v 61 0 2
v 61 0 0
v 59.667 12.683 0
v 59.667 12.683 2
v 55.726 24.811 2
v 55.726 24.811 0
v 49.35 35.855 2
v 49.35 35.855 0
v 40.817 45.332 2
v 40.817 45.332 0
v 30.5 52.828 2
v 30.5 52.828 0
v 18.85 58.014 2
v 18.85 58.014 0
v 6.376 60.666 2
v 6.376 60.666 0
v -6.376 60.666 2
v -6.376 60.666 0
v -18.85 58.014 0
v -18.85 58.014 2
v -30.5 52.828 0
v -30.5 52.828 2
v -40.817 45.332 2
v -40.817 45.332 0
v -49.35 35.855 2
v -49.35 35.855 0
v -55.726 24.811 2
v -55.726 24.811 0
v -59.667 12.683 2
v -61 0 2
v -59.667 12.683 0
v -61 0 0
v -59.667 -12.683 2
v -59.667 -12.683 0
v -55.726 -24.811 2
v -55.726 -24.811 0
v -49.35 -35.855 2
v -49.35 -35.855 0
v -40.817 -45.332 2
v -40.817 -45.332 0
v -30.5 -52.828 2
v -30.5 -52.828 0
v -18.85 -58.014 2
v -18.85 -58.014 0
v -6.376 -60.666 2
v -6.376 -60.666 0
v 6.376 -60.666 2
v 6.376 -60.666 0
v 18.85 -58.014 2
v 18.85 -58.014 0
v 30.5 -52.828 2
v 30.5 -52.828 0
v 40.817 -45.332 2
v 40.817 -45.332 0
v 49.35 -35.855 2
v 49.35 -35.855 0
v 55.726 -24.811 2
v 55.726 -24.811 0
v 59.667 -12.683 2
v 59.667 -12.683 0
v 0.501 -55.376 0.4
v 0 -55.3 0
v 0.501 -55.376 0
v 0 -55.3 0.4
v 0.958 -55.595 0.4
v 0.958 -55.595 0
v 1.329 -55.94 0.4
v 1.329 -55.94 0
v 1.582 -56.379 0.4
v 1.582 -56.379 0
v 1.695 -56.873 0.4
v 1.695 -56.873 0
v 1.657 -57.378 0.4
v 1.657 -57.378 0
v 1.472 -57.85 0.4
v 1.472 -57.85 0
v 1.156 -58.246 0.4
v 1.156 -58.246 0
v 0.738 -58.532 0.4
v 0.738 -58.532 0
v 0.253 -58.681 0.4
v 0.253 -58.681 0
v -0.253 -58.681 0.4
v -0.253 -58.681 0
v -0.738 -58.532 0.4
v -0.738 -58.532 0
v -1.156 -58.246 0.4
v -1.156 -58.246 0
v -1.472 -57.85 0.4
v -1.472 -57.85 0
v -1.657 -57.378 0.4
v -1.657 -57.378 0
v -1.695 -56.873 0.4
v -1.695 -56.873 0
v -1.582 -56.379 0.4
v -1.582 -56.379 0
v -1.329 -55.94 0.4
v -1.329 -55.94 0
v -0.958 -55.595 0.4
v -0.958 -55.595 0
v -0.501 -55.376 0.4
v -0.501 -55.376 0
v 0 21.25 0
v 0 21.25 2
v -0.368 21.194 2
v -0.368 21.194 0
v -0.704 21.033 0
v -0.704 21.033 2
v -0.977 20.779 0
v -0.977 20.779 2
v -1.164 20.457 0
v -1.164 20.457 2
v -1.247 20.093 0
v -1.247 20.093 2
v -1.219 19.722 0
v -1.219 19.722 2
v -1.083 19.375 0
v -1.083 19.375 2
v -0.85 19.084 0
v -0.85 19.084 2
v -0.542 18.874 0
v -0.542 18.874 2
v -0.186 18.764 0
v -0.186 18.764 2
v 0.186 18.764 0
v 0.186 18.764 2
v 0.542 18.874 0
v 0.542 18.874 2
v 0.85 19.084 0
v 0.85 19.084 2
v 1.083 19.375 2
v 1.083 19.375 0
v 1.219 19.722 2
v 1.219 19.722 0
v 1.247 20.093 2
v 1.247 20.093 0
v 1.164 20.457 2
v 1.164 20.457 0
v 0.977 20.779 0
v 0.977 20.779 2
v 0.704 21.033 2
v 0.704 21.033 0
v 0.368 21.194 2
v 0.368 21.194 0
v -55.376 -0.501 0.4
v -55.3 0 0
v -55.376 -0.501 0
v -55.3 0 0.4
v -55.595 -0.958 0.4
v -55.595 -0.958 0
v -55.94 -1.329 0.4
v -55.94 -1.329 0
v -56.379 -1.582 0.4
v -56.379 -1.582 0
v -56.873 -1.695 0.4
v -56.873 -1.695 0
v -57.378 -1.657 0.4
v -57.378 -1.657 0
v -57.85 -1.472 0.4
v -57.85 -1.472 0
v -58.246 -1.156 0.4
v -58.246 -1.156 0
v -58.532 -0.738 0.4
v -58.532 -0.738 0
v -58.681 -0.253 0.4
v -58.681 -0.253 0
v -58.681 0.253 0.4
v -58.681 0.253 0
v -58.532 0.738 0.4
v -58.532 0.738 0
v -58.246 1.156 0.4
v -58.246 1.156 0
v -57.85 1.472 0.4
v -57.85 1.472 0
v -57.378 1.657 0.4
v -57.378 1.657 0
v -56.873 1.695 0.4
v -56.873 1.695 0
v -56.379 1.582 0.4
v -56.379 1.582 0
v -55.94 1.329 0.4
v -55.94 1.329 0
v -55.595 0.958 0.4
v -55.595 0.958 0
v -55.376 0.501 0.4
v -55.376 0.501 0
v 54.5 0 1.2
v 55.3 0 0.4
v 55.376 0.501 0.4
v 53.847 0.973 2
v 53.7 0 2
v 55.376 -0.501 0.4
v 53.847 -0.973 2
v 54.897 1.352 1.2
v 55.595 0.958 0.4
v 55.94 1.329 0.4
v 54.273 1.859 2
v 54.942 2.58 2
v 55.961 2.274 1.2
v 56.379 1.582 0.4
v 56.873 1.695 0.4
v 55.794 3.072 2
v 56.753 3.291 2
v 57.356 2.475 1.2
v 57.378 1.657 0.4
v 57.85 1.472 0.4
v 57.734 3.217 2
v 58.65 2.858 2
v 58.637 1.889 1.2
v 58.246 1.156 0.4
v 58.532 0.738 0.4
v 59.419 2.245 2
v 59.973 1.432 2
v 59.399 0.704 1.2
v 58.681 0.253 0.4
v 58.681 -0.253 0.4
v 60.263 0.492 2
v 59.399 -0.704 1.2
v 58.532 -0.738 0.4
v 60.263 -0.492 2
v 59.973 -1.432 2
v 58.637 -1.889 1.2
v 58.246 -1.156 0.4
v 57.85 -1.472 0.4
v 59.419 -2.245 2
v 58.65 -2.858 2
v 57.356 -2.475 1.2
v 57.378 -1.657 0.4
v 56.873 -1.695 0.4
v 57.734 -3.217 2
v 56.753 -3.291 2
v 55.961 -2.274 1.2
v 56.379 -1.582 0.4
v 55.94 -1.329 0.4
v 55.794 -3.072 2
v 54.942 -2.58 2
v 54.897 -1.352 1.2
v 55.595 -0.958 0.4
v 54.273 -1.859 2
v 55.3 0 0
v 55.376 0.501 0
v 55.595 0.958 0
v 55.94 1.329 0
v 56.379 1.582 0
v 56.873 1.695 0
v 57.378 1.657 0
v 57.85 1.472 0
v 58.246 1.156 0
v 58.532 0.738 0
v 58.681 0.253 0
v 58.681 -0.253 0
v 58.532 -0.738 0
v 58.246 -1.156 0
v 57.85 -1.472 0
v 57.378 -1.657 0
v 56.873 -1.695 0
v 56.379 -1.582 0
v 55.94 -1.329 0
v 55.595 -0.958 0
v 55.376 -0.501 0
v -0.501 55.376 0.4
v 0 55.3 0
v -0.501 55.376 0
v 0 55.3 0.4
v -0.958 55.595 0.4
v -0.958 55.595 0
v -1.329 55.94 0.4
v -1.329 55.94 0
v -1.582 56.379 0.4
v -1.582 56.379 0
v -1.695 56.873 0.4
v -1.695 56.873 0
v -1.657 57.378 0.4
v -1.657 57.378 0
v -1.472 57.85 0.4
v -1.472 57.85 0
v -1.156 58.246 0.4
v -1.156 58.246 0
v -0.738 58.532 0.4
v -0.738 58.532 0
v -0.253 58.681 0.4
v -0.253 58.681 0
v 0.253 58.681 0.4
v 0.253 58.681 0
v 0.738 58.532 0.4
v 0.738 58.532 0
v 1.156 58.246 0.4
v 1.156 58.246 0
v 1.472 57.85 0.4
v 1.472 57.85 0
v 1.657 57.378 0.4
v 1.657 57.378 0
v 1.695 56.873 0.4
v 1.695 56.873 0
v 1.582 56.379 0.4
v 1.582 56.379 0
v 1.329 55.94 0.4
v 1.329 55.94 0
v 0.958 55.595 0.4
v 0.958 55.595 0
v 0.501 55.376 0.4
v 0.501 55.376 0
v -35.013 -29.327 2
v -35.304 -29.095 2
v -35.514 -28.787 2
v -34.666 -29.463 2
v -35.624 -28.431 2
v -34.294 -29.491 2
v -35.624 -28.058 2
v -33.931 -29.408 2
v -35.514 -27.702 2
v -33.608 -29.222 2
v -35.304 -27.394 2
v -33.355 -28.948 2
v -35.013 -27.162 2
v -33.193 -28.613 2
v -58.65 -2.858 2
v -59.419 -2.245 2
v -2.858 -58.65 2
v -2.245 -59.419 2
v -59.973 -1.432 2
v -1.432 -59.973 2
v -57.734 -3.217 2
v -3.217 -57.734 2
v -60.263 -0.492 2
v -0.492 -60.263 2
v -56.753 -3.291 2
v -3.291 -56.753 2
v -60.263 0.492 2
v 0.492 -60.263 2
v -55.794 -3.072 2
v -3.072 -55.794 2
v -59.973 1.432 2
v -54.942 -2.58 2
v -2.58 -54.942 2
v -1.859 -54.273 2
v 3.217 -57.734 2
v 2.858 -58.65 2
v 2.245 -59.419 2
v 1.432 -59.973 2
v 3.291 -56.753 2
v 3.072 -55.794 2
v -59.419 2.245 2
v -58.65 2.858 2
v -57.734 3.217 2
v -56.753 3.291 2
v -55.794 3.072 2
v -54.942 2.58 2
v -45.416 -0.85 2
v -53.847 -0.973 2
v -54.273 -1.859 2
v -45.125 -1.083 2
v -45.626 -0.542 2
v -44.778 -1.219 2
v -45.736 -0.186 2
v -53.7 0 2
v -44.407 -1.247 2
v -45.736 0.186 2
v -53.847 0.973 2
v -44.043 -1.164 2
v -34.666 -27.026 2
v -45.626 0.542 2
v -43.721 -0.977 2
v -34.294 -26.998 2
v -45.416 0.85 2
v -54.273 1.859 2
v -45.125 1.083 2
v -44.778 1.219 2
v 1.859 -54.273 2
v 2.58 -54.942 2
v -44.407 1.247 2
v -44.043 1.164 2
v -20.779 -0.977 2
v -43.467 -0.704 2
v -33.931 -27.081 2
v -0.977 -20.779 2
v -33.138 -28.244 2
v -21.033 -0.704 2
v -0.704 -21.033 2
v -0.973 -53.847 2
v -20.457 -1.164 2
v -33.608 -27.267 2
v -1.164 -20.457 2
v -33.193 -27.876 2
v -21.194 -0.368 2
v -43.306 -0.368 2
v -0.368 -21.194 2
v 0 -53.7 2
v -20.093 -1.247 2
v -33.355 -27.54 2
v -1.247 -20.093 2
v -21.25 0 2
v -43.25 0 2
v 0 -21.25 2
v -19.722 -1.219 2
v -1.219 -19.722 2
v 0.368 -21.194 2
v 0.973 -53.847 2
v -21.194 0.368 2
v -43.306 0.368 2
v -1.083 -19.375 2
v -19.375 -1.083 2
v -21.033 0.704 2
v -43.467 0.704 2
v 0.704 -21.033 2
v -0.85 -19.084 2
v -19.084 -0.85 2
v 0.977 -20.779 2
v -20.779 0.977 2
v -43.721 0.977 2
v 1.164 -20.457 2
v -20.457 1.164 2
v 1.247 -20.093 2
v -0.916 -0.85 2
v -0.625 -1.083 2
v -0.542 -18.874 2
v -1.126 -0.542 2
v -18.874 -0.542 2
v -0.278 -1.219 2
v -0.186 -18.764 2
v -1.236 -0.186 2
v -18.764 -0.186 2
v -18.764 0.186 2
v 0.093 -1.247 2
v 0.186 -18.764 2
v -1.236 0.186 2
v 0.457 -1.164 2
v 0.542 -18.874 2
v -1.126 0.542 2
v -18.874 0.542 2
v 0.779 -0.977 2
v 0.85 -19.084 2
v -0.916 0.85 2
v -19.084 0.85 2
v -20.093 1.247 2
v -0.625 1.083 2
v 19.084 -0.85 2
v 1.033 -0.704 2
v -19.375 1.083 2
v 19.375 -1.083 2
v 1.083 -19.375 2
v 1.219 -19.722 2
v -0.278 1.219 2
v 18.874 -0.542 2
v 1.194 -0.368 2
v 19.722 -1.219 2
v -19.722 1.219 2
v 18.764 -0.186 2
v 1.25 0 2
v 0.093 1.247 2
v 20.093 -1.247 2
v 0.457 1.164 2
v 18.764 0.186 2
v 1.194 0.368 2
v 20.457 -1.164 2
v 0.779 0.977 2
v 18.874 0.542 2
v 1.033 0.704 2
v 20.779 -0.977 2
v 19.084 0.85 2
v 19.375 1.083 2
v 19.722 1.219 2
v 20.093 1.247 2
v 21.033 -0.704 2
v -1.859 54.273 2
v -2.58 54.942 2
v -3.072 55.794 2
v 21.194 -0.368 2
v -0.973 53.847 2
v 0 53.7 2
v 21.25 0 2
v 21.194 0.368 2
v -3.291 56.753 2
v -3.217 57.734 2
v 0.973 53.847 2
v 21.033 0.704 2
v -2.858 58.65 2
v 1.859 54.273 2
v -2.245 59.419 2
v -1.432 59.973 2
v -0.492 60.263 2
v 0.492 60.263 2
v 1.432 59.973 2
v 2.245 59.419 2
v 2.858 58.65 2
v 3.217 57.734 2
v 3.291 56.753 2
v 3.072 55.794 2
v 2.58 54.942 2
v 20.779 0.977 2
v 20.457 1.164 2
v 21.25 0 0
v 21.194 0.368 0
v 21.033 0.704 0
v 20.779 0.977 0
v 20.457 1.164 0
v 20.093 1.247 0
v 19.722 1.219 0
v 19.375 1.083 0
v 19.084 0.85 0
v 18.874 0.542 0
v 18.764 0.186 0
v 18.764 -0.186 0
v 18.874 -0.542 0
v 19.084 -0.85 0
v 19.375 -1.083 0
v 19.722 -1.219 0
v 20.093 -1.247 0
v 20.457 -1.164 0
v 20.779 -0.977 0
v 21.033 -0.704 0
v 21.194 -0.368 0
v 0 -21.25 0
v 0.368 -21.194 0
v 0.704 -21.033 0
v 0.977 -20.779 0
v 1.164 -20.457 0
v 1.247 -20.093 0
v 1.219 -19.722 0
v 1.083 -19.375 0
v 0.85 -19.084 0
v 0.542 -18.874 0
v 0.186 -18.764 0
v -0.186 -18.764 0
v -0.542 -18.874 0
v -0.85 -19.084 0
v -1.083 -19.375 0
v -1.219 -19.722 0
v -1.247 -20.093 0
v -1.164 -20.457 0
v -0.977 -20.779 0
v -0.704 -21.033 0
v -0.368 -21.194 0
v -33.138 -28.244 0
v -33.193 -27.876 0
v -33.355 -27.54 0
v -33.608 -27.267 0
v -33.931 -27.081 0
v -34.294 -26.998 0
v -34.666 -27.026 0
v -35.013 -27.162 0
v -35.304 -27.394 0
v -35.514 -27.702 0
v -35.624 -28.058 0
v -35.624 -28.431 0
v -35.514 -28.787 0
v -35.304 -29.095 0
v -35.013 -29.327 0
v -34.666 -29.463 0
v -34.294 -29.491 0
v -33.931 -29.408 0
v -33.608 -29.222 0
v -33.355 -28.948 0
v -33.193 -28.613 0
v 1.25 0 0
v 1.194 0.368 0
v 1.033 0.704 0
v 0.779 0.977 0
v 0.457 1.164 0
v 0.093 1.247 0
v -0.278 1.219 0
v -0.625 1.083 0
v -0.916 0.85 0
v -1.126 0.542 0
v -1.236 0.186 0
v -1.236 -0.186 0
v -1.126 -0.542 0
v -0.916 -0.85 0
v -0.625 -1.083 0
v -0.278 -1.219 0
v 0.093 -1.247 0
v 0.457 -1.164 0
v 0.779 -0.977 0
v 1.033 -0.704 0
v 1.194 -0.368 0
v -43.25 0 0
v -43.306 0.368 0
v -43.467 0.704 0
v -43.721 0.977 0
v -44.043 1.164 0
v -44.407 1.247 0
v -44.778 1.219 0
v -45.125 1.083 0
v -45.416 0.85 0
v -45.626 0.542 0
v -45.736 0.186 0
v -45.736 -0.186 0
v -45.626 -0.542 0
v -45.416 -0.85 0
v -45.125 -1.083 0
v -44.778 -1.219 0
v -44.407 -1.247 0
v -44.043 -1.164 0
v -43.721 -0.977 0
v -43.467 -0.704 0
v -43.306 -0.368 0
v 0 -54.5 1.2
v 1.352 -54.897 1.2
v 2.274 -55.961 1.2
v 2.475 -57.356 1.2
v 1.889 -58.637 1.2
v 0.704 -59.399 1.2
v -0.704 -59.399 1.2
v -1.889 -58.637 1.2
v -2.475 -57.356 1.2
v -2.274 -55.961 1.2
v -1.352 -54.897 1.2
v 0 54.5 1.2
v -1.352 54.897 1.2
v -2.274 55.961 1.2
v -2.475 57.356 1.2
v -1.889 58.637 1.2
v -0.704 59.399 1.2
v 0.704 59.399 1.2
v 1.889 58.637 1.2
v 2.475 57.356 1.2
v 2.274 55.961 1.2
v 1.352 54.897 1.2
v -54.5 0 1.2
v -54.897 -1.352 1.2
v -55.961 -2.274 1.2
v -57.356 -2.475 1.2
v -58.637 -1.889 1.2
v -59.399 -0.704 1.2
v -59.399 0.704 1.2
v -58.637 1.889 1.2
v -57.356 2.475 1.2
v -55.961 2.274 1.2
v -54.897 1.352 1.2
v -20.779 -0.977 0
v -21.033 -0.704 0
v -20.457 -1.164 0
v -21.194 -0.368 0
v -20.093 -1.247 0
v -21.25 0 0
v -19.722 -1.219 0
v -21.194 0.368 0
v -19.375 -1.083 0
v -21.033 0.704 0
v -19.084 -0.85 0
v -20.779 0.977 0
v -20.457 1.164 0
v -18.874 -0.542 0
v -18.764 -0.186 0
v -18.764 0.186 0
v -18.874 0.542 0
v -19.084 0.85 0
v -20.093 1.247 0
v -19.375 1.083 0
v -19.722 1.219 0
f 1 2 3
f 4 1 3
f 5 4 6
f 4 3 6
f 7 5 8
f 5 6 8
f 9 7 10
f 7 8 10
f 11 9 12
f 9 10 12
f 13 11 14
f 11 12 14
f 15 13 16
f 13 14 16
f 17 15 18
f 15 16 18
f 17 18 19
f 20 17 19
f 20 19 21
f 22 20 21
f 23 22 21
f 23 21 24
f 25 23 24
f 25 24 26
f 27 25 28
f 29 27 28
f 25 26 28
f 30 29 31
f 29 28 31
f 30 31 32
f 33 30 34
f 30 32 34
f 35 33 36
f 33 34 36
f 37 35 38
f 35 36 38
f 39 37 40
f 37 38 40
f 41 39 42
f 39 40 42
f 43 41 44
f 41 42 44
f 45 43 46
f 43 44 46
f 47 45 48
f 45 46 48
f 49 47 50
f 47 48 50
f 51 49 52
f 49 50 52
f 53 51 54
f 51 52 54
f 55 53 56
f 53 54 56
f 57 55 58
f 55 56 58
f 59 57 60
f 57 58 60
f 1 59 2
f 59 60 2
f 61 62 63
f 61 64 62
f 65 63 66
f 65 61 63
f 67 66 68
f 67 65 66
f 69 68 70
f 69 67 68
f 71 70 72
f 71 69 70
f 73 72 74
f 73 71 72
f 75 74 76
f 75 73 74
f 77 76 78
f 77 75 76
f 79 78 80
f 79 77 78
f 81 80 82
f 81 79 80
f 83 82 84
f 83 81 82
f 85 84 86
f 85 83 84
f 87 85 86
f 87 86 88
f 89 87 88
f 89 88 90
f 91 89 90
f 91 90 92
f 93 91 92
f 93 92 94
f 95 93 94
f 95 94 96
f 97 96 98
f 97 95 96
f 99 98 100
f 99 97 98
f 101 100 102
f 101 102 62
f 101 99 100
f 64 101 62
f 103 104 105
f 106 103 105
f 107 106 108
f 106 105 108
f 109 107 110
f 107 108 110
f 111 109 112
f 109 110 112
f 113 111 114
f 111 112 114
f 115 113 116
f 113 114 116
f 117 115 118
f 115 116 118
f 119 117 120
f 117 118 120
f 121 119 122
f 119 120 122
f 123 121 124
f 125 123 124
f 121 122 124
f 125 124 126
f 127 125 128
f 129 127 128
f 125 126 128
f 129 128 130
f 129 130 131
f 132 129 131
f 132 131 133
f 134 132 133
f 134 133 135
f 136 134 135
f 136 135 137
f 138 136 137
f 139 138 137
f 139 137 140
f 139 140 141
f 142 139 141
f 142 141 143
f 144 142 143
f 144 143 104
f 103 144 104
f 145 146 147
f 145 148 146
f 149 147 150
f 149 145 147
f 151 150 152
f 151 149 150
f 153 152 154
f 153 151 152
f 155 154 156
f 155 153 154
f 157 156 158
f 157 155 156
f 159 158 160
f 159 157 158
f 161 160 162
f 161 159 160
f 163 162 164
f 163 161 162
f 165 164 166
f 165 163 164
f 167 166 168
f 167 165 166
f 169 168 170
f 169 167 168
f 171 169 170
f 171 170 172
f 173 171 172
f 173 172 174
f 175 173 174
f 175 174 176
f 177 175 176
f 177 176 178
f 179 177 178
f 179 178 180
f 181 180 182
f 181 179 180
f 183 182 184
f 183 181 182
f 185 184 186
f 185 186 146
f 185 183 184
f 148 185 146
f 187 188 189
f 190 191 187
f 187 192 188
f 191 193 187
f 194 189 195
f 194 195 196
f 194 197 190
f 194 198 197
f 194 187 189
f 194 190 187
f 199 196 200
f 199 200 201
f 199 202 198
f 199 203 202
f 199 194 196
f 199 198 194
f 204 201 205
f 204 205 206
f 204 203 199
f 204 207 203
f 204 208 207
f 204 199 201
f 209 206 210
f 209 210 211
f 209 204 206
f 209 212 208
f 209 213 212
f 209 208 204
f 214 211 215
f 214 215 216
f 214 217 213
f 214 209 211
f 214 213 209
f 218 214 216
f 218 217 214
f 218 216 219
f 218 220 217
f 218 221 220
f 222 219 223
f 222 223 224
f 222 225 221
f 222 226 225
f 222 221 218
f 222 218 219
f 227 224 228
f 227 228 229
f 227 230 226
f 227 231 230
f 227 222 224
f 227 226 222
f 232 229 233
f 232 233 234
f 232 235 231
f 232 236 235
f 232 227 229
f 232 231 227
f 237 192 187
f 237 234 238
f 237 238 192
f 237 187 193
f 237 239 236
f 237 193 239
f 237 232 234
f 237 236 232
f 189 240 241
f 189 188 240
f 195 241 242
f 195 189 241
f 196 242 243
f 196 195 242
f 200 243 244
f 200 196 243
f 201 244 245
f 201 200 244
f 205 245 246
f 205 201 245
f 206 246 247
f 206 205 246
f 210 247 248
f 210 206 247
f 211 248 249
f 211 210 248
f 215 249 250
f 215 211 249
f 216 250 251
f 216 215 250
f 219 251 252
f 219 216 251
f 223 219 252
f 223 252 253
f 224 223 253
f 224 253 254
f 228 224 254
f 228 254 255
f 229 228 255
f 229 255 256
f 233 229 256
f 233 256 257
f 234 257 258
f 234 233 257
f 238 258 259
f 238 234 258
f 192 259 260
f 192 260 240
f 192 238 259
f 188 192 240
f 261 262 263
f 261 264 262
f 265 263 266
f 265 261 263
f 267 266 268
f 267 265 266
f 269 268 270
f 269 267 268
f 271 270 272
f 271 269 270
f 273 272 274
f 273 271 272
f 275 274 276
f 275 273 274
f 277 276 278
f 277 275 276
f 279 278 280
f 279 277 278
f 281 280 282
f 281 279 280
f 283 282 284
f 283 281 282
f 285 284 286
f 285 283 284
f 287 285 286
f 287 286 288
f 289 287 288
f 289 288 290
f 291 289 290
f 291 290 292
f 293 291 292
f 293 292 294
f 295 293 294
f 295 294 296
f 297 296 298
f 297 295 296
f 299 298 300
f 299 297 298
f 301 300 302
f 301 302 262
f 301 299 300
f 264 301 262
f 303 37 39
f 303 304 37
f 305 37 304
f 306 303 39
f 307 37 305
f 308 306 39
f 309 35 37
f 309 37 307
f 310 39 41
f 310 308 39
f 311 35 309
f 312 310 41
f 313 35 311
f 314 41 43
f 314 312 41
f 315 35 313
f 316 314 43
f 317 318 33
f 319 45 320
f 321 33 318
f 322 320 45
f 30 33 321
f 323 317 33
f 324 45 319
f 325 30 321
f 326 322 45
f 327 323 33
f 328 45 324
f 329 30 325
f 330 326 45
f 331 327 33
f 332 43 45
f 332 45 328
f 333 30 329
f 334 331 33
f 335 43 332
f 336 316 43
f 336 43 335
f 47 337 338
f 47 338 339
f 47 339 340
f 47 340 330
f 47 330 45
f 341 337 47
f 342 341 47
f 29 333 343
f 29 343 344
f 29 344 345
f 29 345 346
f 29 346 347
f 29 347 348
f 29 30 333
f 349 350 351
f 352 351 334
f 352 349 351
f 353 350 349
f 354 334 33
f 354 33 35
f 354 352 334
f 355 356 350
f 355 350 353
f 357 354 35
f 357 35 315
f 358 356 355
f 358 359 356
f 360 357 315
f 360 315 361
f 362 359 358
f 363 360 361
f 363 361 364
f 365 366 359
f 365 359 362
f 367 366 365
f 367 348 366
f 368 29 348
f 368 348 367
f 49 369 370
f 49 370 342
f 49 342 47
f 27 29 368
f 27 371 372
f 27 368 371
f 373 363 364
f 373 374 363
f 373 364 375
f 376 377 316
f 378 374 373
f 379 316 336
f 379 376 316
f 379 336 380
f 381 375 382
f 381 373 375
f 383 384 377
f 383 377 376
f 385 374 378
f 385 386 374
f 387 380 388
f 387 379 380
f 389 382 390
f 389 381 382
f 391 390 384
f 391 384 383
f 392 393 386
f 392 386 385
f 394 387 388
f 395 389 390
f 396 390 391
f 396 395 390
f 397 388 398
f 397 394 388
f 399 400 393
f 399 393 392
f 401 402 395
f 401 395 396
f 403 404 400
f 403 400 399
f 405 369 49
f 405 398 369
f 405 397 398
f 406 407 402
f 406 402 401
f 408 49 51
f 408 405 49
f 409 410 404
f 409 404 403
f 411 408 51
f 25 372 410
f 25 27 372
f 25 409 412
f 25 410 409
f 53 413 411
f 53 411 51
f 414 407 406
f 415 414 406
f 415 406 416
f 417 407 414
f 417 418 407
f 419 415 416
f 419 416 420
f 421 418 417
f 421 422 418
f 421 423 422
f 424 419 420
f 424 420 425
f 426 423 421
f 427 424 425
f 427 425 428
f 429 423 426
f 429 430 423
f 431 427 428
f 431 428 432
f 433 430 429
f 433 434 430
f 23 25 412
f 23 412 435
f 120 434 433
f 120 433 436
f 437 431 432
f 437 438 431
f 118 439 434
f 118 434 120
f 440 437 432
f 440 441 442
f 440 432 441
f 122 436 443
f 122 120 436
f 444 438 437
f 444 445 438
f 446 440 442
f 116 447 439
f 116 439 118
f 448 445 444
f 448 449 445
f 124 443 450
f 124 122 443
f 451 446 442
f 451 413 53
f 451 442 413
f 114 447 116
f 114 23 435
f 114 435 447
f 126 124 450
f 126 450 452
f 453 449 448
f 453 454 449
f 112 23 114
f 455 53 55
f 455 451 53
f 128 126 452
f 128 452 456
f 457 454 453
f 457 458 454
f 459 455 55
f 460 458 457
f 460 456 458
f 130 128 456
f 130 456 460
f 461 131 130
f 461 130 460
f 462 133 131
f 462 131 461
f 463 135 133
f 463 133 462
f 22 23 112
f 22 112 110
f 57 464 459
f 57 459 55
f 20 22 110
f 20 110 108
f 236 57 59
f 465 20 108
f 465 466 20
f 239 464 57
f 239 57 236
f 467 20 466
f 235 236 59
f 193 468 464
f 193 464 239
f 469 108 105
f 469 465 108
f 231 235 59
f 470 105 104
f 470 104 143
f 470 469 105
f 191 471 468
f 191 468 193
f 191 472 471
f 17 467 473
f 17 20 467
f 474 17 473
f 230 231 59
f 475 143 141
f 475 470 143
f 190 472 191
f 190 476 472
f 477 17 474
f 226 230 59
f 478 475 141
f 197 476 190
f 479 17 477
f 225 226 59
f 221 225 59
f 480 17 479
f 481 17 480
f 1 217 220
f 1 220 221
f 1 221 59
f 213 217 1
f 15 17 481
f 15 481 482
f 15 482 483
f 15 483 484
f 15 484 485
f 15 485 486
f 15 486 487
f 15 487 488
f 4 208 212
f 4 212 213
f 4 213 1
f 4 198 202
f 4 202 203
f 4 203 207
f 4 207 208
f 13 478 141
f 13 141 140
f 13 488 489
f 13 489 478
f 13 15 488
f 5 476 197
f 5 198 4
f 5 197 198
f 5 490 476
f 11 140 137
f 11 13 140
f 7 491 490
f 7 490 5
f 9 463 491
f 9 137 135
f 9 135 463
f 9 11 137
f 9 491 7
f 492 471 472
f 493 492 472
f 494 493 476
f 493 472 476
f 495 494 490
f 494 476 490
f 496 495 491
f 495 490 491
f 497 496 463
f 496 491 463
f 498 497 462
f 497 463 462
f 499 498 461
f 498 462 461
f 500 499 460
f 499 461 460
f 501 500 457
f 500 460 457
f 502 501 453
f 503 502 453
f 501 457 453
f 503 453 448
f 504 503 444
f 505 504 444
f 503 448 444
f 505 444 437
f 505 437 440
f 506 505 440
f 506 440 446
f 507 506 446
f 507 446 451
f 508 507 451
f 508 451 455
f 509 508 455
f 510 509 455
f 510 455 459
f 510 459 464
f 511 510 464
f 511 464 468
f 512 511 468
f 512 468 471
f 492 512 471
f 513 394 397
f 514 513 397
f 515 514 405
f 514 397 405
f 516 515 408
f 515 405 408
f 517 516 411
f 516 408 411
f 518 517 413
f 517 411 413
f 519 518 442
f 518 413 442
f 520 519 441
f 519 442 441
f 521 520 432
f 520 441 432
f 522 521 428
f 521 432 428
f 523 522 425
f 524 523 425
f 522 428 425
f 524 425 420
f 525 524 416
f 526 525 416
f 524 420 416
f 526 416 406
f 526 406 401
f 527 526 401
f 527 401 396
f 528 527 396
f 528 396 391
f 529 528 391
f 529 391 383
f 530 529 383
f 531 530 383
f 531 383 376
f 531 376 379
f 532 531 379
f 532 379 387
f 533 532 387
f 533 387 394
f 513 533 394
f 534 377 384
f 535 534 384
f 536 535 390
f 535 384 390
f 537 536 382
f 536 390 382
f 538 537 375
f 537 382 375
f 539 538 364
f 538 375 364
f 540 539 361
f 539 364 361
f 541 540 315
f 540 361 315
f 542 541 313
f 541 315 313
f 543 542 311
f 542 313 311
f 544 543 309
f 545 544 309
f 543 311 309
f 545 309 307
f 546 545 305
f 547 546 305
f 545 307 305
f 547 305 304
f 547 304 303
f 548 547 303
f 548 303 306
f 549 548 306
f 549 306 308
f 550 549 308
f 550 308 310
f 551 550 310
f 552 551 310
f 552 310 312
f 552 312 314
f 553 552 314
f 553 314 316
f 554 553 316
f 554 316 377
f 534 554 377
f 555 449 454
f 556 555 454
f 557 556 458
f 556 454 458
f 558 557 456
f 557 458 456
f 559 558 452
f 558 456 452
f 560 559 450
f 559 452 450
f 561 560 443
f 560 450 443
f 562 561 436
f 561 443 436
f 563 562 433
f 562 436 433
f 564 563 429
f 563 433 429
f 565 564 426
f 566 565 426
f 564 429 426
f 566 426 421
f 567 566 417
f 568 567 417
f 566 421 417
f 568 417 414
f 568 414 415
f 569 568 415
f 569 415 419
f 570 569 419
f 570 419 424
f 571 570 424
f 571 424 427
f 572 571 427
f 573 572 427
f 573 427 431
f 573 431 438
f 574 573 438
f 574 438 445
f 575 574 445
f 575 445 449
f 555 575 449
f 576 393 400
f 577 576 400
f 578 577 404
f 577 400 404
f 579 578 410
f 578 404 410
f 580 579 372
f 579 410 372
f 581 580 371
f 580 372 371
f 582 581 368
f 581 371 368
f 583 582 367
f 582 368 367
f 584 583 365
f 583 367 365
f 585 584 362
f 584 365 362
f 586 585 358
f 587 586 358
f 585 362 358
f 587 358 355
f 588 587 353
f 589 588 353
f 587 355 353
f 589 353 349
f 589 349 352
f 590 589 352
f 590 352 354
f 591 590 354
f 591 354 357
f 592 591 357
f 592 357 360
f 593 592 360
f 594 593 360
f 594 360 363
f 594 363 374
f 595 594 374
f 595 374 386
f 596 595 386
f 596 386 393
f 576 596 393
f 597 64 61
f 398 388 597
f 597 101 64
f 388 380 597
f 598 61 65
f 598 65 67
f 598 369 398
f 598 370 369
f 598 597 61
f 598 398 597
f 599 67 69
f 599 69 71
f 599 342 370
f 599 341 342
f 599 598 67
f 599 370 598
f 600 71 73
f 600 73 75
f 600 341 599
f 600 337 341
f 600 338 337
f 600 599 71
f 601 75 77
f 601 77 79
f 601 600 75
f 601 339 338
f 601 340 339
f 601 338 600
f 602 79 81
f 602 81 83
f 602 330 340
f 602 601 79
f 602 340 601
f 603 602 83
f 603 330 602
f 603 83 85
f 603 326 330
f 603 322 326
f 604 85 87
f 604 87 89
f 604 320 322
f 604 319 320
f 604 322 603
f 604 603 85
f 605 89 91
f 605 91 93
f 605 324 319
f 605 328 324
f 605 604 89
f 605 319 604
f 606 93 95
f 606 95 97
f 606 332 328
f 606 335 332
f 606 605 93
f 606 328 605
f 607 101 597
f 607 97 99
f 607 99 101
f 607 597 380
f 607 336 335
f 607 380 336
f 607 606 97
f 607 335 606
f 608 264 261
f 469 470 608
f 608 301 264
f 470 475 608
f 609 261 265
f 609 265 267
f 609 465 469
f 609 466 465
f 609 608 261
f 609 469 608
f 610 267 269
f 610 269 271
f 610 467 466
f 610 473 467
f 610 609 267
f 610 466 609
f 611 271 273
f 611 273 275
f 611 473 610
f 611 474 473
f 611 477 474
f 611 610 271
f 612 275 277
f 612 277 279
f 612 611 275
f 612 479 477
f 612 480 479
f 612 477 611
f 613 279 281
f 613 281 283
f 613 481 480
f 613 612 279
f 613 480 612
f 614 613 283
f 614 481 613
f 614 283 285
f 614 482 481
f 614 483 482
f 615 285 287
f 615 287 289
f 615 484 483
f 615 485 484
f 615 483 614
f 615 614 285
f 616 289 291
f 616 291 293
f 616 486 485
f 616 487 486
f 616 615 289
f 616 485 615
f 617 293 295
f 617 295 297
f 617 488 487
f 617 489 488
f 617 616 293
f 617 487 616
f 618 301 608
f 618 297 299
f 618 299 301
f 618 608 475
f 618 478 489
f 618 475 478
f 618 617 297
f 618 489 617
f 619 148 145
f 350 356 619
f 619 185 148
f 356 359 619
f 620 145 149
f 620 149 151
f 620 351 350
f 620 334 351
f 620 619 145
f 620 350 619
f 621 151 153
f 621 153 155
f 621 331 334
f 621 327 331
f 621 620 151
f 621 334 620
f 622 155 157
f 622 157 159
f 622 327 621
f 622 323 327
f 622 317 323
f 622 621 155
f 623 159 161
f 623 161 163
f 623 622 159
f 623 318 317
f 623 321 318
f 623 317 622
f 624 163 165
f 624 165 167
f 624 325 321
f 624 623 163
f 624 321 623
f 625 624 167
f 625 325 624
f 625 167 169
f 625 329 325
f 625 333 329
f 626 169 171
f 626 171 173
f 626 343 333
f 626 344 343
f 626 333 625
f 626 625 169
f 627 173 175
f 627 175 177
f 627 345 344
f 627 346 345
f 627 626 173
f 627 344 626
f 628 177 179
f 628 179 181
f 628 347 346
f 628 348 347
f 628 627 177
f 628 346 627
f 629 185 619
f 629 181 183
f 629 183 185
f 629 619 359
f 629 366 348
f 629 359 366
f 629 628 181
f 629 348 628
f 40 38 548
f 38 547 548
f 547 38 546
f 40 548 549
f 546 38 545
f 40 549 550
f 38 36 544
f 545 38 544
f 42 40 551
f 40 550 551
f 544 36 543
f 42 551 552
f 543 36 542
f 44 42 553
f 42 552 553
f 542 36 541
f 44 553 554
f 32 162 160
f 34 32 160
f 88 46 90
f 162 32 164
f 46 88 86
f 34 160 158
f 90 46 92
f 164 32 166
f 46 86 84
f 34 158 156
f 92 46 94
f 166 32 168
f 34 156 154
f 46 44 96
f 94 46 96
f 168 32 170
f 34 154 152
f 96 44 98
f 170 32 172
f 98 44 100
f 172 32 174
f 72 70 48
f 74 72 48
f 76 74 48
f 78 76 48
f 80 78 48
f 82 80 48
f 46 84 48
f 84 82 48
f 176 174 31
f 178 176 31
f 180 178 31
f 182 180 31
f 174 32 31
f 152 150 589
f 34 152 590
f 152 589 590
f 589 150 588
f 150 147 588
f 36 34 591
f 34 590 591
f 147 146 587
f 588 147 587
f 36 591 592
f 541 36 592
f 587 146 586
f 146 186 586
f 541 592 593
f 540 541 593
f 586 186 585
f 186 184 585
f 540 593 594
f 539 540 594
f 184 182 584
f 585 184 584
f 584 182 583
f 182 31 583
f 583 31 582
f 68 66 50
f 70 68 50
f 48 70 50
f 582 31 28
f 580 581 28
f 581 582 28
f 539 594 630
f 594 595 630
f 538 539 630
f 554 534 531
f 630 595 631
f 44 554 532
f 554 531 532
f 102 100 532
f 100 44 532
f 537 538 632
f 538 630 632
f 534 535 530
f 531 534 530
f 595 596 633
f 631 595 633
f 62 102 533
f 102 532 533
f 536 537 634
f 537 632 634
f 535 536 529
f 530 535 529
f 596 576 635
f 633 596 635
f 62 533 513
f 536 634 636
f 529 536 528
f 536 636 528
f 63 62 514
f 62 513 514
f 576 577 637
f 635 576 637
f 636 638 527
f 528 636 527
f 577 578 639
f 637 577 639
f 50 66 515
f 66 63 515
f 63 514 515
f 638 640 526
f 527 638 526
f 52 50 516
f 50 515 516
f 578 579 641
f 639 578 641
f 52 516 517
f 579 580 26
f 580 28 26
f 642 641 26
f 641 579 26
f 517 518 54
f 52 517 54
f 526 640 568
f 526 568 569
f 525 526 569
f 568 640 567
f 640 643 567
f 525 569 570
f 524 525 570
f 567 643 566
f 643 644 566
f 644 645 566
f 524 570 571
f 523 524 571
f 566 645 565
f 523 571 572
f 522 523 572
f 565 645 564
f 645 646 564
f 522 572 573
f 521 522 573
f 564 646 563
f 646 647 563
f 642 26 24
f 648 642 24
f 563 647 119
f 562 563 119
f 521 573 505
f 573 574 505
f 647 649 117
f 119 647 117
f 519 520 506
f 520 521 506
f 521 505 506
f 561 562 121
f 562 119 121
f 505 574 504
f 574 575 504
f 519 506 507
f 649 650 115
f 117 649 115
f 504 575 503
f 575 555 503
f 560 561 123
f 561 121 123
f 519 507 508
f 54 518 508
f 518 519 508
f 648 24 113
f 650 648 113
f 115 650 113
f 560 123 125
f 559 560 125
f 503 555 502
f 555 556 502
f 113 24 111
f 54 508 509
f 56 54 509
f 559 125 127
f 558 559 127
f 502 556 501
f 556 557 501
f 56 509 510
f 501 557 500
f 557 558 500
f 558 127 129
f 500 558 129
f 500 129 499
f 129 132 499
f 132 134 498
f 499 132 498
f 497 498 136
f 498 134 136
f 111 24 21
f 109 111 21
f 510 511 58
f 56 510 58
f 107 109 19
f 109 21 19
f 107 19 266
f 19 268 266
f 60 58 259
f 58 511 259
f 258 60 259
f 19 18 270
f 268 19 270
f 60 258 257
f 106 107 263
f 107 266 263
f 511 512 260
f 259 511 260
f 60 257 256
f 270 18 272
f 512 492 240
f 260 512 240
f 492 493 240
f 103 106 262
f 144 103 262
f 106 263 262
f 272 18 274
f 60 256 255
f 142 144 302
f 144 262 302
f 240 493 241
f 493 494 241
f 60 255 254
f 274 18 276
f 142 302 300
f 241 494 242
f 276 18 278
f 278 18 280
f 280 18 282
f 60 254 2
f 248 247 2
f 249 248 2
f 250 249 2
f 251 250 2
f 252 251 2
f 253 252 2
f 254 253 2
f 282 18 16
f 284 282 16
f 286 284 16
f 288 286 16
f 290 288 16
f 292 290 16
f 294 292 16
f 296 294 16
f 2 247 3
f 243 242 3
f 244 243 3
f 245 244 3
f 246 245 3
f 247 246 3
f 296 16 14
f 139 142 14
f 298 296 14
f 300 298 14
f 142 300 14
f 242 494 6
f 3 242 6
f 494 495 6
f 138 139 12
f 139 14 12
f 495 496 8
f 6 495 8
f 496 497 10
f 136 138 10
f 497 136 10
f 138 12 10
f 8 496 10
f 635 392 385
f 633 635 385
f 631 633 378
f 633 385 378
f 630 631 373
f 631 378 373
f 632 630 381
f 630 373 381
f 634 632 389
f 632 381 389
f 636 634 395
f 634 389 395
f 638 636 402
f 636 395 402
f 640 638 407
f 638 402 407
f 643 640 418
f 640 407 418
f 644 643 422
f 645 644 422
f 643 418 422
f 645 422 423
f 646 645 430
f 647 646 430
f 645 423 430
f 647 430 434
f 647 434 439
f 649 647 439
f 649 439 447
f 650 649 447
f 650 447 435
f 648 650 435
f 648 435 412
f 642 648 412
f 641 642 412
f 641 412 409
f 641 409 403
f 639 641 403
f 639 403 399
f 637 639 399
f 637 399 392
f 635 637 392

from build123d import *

# Parameters (mm, degrees)
SKETCH_1_R               = 61
EXTRUDE_1_DEPTH          = 2
PATTERN_CIRCULAR_1_COUNT = 4
HOLE_WIZARD_M3_1_D       = 2.5
PATTERN_CIRCULAR_2_COUNT = 4
HOLE_WIZARD_M3_2_D       = 2.5
HOLE_WIZARD_M3_3_D       = 2.5


with BuildPart() as part:
    # 草图1 → 凸台-拉伸1 (new body)
    with BuildSketch(Plane.XY):
        Circle(SKETCH_1_R)
    extrude(amount=EXTRUDE_1_DEPTH)

    # 草图3 → 打孔尺寸(%根据十字)槽半沉头木螺钉的类型1 (revolve, cut)
    with BuildSketch(Plane(origin=(0, 57, 2), x_dir=(0, -1, 0), z_dir=(1, 0, 0))):
        Polygon((0, 0), (0, 2), (1.7, 2), (1.7, 1.6), (3.3, 0), align=None)
    hole_wizard_1 = revolve(axis=Axis((0, 57, 8.35), (0, 0, -1)), mode=Mode.SUBTRACT)

    # 阵列(圆周)1: 打孔尺寸(%根据十字)槽半沉头木螺钉的类型1 ×4 about axis
    pattern_circular_1_axis = Axis((0, 0, 0), (0, 0, 1))
    for i in range(1, PATTERN_CIRCULAR_1_COUNT):
        add(hole_wizard_1.rotate(pattern_circular_1_axis, i * 360 / PATTERN_CIRCULAR_1_COUNT), mode=Mode.SUBTRACT)

    # M3 螺纹孔1 (through all)
    with Locations(Plane(origin=(0, 0, 0), x_dir=(-1, 0, 0), z_dir=(0, 0, -1))):
        with Locations((-20, 0)):
            hole_wizard_m3_1 = Hole(HOLE_WIZARD_M3_1_D / 2)

    # 阵列(圆周)2: M3 螺纹孔1 ×4 about axis
    pattern_circular_2_axis = Axis((0, 0, 0), (0, 0, 1))
    for i in range(1, PATTERN_CIRCULAR_2_COUNT):
        add(hole_wizard_m3_1.rotate(pattern_circular_2_axis, i * 360 / PATTERN_CIRCULAR_2_COUNT), mode=Mode.SUBTRACT)

    # M3 螺纹孔2 (through all)
    with Locations(Plane(origin=(0, 0, 0), x_dir=(-1, 0, 0), z_dir=(0, 0, -1))):
        with Locations((0, 0)):
            Hole(HOLE_WIZARD_M3_2_D / 2)

    # M3 螺纹孔3 (through all)
    with Locations(Plane(origin=(0, 0, 0), x_dir=(-1, 0, 0), z_dir=(0, 0, -1))):
        with Locations((34.387640449, -28.244294722), (44.5, 0)):
            Hole(HOLE_WIZARD_M3_3_D / 2)


solid = part.part
